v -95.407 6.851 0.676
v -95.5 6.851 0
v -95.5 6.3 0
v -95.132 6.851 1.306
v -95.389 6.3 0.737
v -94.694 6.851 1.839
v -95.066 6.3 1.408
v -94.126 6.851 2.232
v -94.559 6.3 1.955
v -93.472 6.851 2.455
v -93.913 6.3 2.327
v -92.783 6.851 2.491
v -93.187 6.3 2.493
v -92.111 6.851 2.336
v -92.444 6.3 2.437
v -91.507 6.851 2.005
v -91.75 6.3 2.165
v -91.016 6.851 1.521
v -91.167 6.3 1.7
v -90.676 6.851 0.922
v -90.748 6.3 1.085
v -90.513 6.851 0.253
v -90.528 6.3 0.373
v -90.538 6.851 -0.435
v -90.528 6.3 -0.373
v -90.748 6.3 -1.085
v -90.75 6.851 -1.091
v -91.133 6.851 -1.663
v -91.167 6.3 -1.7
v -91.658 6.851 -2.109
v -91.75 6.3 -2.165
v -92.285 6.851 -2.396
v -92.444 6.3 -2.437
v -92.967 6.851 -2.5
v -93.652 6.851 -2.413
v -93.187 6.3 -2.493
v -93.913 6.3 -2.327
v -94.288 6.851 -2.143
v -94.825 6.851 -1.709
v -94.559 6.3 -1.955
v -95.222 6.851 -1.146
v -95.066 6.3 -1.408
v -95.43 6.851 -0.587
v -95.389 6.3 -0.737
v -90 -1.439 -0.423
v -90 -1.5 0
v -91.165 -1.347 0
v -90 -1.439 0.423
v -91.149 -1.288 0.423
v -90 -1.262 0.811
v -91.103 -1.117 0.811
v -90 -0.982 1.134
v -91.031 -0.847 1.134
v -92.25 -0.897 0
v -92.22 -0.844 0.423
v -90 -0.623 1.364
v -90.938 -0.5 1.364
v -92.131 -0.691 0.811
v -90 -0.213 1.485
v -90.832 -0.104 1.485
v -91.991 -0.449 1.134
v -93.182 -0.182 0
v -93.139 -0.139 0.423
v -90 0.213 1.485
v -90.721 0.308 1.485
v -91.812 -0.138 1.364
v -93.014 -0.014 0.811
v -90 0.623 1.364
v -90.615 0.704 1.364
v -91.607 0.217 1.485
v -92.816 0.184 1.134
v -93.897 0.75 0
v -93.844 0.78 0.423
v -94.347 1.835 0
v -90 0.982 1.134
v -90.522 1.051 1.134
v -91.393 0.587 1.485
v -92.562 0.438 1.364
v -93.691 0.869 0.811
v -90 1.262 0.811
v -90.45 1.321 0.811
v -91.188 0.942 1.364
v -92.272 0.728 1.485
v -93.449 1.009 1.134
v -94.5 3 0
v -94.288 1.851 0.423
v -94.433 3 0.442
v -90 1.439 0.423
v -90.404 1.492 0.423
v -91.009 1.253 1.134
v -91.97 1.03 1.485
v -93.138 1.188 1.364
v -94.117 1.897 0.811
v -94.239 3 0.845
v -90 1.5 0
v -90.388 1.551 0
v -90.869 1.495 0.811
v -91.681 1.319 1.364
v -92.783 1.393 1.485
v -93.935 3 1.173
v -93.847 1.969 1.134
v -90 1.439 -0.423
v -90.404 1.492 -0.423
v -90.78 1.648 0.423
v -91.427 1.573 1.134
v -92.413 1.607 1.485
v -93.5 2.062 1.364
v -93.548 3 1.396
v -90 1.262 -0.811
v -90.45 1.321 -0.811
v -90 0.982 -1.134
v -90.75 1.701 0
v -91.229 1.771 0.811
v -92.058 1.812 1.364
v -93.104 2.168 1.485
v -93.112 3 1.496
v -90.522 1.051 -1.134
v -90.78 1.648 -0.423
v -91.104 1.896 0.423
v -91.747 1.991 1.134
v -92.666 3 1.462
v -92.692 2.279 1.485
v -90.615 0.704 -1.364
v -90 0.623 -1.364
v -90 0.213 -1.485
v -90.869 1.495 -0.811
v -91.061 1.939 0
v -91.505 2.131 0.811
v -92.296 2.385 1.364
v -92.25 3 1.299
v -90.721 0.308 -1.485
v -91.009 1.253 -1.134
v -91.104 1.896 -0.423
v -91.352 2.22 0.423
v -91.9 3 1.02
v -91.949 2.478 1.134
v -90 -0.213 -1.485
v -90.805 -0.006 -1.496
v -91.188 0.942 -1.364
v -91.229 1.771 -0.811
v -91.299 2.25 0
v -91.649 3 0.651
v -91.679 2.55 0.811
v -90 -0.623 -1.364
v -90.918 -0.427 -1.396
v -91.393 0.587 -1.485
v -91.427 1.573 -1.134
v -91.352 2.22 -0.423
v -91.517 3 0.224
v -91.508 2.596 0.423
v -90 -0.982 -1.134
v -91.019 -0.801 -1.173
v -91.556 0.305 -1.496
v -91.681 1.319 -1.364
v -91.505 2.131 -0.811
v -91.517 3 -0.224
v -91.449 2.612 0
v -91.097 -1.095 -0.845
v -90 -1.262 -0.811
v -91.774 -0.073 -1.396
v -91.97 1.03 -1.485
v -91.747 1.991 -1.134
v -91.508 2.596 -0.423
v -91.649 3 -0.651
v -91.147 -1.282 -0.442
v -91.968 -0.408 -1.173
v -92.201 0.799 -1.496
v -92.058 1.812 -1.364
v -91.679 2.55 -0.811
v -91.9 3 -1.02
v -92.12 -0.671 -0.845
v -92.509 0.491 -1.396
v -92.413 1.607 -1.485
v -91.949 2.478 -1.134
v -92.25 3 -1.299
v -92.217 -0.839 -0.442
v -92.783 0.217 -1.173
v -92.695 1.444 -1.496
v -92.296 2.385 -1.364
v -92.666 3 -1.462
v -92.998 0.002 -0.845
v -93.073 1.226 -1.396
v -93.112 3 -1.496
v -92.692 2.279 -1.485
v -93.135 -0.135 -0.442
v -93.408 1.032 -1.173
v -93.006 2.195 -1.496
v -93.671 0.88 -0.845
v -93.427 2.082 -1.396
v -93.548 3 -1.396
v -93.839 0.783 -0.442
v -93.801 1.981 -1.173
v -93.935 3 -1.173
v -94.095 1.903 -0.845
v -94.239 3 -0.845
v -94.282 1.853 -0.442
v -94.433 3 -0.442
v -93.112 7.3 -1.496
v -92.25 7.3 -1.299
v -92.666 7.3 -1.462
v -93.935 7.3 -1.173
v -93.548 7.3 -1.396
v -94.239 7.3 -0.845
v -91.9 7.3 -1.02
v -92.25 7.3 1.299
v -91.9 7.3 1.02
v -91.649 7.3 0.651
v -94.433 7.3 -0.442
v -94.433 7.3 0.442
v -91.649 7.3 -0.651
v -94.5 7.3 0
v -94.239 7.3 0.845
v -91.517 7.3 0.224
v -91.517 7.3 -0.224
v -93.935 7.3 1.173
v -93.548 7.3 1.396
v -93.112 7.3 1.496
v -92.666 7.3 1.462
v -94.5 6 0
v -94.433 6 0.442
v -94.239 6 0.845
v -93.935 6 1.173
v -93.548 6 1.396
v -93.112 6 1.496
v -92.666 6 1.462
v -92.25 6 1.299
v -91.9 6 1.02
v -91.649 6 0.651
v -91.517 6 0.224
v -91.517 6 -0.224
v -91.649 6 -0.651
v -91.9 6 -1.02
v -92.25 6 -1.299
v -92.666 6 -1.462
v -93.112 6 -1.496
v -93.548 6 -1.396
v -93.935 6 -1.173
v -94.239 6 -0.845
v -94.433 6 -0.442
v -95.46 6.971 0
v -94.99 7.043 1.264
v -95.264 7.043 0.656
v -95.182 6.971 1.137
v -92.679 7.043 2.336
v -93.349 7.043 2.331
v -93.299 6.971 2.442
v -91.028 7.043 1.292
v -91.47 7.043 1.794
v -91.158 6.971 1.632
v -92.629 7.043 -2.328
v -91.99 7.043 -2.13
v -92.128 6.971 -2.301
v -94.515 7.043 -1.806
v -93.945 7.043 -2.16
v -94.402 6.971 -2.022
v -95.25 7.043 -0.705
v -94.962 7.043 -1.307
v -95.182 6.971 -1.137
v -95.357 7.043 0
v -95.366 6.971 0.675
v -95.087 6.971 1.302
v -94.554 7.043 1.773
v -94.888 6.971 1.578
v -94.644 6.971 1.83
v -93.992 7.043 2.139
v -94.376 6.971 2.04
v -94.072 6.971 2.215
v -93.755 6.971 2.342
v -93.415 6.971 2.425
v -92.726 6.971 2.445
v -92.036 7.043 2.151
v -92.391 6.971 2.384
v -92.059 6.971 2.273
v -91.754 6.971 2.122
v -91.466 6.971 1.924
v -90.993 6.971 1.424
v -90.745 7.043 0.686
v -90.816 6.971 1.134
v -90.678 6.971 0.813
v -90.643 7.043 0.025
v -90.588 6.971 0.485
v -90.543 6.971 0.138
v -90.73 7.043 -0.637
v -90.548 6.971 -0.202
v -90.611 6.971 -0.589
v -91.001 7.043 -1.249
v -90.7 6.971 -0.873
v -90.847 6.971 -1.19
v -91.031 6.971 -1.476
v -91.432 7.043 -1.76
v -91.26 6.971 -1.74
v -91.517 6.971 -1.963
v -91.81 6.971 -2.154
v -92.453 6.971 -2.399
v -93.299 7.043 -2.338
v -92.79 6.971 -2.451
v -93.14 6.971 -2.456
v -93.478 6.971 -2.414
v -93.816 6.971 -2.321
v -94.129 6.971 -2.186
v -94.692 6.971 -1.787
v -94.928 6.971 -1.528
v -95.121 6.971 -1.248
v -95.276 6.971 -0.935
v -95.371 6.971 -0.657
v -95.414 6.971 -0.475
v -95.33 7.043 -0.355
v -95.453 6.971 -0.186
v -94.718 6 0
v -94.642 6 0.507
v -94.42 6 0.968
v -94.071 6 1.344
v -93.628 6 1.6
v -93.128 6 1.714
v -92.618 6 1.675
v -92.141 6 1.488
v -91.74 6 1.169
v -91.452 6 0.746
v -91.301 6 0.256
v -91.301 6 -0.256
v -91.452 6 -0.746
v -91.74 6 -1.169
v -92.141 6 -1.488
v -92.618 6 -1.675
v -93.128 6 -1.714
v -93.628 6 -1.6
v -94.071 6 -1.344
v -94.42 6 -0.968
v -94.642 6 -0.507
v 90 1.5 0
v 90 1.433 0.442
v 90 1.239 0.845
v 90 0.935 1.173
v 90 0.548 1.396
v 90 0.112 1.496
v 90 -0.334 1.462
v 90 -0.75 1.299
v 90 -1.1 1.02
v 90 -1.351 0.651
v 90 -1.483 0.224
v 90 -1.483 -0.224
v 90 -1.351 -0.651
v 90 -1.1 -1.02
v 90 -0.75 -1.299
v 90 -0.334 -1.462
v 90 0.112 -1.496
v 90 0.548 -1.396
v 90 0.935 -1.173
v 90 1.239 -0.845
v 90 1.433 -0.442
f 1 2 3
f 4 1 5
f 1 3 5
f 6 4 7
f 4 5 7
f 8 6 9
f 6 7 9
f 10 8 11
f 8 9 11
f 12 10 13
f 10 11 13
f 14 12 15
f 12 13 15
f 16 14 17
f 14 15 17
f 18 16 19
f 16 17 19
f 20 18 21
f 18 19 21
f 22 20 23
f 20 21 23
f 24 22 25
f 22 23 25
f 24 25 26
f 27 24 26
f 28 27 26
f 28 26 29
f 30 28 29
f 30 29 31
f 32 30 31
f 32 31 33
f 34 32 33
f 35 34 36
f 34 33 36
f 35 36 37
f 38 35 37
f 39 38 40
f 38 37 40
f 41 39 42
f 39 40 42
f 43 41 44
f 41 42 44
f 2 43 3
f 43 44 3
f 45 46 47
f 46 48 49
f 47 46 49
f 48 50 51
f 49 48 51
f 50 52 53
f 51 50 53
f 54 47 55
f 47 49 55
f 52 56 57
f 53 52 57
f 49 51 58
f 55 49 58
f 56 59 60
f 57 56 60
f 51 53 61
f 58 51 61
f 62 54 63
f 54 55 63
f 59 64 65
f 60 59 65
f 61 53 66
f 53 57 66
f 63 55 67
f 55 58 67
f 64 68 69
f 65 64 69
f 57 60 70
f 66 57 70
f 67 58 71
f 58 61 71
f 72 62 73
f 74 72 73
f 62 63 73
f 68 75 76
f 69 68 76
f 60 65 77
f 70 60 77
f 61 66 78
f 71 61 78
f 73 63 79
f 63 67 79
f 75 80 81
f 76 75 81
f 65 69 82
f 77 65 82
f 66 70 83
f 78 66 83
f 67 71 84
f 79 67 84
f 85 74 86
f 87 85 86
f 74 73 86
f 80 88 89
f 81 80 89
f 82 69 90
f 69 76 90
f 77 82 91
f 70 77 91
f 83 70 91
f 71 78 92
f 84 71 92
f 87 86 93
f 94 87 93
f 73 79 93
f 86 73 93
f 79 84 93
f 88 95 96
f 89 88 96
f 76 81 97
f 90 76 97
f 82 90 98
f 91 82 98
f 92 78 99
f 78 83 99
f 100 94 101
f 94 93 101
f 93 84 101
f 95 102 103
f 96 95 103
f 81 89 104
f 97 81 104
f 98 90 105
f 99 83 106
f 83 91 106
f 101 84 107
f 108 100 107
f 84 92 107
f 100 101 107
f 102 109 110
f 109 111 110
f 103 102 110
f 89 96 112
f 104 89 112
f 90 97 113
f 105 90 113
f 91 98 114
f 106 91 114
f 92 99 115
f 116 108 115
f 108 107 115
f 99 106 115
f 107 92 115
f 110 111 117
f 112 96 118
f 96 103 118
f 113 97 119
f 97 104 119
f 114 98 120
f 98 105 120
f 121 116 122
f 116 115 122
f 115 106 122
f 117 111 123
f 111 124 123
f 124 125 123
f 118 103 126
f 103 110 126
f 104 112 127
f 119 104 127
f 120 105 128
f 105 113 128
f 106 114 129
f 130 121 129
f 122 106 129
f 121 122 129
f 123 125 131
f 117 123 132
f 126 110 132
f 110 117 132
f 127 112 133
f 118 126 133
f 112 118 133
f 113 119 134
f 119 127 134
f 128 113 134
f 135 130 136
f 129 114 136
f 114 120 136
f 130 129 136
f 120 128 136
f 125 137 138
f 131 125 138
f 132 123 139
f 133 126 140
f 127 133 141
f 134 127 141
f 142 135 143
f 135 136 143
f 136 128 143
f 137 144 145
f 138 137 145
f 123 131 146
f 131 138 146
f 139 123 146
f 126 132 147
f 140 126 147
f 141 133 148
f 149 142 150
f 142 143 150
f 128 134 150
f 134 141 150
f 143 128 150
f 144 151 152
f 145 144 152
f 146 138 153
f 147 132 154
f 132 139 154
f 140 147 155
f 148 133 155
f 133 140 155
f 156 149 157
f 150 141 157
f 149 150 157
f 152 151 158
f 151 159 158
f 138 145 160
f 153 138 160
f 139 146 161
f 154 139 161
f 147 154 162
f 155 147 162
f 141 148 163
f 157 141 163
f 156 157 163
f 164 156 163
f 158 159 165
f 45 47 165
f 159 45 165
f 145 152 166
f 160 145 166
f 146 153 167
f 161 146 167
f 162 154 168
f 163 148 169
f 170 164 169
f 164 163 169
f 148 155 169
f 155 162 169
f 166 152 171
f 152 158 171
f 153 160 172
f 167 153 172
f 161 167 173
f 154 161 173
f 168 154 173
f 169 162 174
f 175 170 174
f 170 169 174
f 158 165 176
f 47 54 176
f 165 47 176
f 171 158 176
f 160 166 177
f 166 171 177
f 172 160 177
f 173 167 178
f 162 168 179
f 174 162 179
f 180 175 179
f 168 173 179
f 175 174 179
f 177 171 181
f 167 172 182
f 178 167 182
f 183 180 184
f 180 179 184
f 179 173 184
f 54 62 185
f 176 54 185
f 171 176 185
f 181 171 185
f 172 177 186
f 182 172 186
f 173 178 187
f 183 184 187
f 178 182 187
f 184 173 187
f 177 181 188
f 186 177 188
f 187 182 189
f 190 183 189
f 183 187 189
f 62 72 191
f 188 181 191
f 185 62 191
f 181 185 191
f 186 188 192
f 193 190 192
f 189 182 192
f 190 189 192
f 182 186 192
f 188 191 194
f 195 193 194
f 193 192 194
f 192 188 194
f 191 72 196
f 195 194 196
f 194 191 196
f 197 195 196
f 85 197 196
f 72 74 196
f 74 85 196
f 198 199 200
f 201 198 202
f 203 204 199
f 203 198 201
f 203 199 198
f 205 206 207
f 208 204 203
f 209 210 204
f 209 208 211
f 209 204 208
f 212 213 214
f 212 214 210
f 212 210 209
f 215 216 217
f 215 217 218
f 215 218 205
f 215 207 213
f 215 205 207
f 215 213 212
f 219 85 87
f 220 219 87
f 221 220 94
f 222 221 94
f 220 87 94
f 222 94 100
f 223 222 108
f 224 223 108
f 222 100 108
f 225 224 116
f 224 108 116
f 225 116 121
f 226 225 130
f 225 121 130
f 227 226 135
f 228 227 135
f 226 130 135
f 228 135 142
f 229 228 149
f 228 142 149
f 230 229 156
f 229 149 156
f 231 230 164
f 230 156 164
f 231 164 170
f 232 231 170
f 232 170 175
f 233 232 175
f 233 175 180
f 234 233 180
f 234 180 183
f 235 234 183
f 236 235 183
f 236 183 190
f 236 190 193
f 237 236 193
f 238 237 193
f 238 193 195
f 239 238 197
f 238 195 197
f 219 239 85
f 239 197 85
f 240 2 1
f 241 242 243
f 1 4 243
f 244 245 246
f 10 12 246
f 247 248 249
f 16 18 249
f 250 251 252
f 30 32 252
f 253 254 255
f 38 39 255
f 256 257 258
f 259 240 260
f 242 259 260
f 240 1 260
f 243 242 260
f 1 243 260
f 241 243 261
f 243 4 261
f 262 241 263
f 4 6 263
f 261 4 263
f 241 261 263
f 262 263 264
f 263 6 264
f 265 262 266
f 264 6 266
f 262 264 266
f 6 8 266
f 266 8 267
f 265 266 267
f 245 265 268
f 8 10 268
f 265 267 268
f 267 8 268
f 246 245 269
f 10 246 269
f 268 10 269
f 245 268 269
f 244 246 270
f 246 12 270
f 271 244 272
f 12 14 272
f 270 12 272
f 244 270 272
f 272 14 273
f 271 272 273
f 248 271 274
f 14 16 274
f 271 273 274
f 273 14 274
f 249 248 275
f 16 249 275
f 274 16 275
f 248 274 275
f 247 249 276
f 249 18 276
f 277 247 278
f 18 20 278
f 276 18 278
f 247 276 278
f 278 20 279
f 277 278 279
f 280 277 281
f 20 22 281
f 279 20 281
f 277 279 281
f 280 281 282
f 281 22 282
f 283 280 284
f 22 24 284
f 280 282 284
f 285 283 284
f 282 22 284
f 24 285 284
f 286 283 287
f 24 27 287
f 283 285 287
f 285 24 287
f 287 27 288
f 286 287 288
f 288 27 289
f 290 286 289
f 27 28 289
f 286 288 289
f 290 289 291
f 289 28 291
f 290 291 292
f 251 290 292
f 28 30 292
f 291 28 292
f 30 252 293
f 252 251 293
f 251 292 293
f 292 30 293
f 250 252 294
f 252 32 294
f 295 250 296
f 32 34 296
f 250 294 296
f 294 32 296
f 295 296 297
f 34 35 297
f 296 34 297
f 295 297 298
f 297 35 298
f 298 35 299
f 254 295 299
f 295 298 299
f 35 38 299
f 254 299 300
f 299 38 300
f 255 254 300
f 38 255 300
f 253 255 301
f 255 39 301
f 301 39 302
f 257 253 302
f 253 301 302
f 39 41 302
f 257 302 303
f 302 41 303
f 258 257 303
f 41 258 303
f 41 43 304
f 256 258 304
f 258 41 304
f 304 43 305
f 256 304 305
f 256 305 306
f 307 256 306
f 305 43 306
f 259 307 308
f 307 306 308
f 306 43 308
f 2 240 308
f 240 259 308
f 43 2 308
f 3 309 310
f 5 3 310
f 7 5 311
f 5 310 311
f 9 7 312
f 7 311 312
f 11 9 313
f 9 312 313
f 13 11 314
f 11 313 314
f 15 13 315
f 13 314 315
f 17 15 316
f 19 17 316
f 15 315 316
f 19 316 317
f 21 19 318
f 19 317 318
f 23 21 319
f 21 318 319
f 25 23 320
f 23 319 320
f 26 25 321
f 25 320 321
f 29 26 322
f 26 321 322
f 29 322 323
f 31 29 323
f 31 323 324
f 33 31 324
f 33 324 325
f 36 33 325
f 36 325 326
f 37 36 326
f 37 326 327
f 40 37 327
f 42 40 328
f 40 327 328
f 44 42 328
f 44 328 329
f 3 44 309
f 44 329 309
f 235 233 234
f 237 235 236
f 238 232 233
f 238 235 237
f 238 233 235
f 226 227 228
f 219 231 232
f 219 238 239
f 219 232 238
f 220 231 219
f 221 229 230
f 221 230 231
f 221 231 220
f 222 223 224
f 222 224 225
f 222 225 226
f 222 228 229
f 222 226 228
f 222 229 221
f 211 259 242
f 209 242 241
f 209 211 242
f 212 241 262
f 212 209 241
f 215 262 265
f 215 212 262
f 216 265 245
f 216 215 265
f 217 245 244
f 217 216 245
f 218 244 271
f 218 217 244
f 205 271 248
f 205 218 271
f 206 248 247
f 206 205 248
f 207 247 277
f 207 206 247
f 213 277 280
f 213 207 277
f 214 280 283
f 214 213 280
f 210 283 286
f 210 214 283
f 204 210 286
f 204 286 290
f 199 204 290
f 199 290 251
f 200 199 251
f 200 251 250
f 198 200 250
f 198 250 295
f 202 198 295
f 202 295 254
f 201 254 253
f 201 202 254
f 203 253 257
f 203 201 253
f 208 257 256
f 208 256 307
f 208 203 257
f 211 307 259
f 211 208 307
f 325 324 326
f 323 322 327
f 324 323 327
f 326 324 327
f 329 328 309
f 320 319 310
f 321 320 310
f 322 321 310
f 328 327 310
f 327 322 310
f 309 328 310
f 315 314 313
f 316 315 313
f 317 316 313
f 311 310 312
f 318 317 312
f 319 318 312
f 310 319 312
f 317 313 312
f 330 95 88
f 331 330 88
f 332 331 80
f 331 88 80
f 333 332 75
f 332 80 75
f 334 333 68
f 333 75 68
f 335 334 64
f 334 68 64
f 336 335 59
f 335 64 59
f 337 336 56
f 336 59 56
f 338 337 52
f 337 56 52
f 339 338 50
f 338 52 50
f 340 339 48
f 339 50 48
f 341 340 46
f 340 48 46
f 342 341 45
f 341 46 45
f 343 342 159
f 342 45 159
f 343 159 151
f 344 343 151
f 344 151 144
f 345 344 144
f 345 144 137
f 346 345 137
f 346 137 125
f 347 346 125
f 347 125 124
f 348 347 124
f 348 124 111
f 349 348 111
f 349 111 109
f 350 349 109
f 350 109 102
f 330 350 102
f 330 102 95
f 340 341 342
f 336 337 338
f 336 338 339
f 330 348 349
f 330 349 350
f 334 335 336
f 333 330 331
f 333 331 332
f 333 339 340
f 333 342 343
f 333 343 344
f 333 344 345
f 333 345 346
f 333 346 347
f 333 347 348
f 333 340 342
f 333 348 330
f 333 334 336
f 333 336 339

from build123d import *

# Parameters (mm, degrees)
SKETCH_12_ON_SEGMENT_1_R = 1.5
ROUND_D3MM_1_DEPTH       = 3
SKETCH_12_ON_SEGMENT_2_R = 1.5
ROUND_D3MM_1_2_ANGLE     = 90
SKETCH_12_R              = 1.5
ROUND_D3MM_1_3_DEPTH     = 180
SKETCH_13_R              = 2.5
EXTRUDE_1_DEPTH          = 1.3
CHAMFER_1_SIZE           = 0.3
CHAMFER_1_SIZE2          = 1
CHAMFER_2_SIZE           = 0.3
CHAMFER_2_SIZE2          = 0.781526719
FILLET_5_R               = 0.2


with BuildPart() as part:
    # Эскиз12 on segment 1 (carried to segment 1) → Round D3MM(1) (new body)
    with BuildSketch(Plane(origin=(-93, 3, 0), x_dir=(-1, 0, 0), z_dir=(0, 1, 0))):
        Circle(SKETCH_12_ON_SEGMENT_1_R)
    extrude(amount=ROUND_D3MM_1_DEPTH)


with BuildPart() as body_2:
    # Эскиз12 on segment 2 (carried to the start of arc 2) → Round D3MM_1 2 (revolve)
    with BuildSketch(Plane(origin=(-90, 0, 0), x_dir=(0, -1, 0), z_dir=(-1, 0, 0))):
        Circle(SKETCH_12_ON_SEGMENT_2_R)
    revolve(axis=Axis((-90, 3, 0), (0, 0, -1)), revolution_arc=ROUND_D3MM_1_2_ANGLE)


with BuildPart() as body_3:
    # Эскиз12 → Round D3MM_1 3 (new body)
    with BuildSketch(Plane.YZ.offset(-90)):
        Circle(SKETCH_12_R)
    extrude(amount=ROUND_D3MM_1_3_DEPTH)


with BuildPart() as part_1:
    add(part.part)

    # Round D3MM(1) as one body: union body 2, body 3
    add(body_2.part)
    add(body_3.part)


with BuildPart() as body_2_2:
    # Эскиз13 → Бобышка-Вытянуть1 (new body)
    with BuildSketch(Plane(origin=(0, 6, 0), x_dir=(1, 0, 0), z_dir=(0, 1, 0))):
        with Locations(Location((-93, 0, 0), (0, 0, 180))):
            Circle(SKETCH_13_R)
    extrude(amount=EXTRUDE_1_DEPTH)

    # Фаска1
    chamfer_1_edges = [body_2_2.edges().sort_by_distance(p)[0] for p in [
        (-90.5, 7.3, 0),
    ]]
    chamfer_1_side = [body_2_2.faces().sort_by_distance(p)[0] for p in [
        (-90.5, 6.65, 0),
    ]]
    chamfer(chamfer_1_edges, length=CHAMFER_1_SIZE, length2=CHAMFER_1_SIZE2, reference=chamfer_1_side[0])

    # Фаска2
    chamfer_2_edges = [body_2_2.edges().sort_by_distance(p)[0] for p in [
        (-90.5, 6, 0),
    ]]
    chamfer_2_side = [body_2_2.faces().sort_by_distance(p)[0] for p in [
        (-90.5, 6.5, 0),
    ]]
    chamfer(chamfer_2_edges, length=CHAMFER_2_SIZE, length2=CHAMFER_2_SIZE2, reference=chamfer_2_side[0])

    # Скругление5
    fillet_5_edges = [body_2_2.edges().sort_by_distance(p)[0] for p in [
        (-90.5, 7, 0),
    ]]
    fillet(fillet_5_edges, radius=FILLET_5_R)


solid = Compound([part_1.part, body_2_2.part])
